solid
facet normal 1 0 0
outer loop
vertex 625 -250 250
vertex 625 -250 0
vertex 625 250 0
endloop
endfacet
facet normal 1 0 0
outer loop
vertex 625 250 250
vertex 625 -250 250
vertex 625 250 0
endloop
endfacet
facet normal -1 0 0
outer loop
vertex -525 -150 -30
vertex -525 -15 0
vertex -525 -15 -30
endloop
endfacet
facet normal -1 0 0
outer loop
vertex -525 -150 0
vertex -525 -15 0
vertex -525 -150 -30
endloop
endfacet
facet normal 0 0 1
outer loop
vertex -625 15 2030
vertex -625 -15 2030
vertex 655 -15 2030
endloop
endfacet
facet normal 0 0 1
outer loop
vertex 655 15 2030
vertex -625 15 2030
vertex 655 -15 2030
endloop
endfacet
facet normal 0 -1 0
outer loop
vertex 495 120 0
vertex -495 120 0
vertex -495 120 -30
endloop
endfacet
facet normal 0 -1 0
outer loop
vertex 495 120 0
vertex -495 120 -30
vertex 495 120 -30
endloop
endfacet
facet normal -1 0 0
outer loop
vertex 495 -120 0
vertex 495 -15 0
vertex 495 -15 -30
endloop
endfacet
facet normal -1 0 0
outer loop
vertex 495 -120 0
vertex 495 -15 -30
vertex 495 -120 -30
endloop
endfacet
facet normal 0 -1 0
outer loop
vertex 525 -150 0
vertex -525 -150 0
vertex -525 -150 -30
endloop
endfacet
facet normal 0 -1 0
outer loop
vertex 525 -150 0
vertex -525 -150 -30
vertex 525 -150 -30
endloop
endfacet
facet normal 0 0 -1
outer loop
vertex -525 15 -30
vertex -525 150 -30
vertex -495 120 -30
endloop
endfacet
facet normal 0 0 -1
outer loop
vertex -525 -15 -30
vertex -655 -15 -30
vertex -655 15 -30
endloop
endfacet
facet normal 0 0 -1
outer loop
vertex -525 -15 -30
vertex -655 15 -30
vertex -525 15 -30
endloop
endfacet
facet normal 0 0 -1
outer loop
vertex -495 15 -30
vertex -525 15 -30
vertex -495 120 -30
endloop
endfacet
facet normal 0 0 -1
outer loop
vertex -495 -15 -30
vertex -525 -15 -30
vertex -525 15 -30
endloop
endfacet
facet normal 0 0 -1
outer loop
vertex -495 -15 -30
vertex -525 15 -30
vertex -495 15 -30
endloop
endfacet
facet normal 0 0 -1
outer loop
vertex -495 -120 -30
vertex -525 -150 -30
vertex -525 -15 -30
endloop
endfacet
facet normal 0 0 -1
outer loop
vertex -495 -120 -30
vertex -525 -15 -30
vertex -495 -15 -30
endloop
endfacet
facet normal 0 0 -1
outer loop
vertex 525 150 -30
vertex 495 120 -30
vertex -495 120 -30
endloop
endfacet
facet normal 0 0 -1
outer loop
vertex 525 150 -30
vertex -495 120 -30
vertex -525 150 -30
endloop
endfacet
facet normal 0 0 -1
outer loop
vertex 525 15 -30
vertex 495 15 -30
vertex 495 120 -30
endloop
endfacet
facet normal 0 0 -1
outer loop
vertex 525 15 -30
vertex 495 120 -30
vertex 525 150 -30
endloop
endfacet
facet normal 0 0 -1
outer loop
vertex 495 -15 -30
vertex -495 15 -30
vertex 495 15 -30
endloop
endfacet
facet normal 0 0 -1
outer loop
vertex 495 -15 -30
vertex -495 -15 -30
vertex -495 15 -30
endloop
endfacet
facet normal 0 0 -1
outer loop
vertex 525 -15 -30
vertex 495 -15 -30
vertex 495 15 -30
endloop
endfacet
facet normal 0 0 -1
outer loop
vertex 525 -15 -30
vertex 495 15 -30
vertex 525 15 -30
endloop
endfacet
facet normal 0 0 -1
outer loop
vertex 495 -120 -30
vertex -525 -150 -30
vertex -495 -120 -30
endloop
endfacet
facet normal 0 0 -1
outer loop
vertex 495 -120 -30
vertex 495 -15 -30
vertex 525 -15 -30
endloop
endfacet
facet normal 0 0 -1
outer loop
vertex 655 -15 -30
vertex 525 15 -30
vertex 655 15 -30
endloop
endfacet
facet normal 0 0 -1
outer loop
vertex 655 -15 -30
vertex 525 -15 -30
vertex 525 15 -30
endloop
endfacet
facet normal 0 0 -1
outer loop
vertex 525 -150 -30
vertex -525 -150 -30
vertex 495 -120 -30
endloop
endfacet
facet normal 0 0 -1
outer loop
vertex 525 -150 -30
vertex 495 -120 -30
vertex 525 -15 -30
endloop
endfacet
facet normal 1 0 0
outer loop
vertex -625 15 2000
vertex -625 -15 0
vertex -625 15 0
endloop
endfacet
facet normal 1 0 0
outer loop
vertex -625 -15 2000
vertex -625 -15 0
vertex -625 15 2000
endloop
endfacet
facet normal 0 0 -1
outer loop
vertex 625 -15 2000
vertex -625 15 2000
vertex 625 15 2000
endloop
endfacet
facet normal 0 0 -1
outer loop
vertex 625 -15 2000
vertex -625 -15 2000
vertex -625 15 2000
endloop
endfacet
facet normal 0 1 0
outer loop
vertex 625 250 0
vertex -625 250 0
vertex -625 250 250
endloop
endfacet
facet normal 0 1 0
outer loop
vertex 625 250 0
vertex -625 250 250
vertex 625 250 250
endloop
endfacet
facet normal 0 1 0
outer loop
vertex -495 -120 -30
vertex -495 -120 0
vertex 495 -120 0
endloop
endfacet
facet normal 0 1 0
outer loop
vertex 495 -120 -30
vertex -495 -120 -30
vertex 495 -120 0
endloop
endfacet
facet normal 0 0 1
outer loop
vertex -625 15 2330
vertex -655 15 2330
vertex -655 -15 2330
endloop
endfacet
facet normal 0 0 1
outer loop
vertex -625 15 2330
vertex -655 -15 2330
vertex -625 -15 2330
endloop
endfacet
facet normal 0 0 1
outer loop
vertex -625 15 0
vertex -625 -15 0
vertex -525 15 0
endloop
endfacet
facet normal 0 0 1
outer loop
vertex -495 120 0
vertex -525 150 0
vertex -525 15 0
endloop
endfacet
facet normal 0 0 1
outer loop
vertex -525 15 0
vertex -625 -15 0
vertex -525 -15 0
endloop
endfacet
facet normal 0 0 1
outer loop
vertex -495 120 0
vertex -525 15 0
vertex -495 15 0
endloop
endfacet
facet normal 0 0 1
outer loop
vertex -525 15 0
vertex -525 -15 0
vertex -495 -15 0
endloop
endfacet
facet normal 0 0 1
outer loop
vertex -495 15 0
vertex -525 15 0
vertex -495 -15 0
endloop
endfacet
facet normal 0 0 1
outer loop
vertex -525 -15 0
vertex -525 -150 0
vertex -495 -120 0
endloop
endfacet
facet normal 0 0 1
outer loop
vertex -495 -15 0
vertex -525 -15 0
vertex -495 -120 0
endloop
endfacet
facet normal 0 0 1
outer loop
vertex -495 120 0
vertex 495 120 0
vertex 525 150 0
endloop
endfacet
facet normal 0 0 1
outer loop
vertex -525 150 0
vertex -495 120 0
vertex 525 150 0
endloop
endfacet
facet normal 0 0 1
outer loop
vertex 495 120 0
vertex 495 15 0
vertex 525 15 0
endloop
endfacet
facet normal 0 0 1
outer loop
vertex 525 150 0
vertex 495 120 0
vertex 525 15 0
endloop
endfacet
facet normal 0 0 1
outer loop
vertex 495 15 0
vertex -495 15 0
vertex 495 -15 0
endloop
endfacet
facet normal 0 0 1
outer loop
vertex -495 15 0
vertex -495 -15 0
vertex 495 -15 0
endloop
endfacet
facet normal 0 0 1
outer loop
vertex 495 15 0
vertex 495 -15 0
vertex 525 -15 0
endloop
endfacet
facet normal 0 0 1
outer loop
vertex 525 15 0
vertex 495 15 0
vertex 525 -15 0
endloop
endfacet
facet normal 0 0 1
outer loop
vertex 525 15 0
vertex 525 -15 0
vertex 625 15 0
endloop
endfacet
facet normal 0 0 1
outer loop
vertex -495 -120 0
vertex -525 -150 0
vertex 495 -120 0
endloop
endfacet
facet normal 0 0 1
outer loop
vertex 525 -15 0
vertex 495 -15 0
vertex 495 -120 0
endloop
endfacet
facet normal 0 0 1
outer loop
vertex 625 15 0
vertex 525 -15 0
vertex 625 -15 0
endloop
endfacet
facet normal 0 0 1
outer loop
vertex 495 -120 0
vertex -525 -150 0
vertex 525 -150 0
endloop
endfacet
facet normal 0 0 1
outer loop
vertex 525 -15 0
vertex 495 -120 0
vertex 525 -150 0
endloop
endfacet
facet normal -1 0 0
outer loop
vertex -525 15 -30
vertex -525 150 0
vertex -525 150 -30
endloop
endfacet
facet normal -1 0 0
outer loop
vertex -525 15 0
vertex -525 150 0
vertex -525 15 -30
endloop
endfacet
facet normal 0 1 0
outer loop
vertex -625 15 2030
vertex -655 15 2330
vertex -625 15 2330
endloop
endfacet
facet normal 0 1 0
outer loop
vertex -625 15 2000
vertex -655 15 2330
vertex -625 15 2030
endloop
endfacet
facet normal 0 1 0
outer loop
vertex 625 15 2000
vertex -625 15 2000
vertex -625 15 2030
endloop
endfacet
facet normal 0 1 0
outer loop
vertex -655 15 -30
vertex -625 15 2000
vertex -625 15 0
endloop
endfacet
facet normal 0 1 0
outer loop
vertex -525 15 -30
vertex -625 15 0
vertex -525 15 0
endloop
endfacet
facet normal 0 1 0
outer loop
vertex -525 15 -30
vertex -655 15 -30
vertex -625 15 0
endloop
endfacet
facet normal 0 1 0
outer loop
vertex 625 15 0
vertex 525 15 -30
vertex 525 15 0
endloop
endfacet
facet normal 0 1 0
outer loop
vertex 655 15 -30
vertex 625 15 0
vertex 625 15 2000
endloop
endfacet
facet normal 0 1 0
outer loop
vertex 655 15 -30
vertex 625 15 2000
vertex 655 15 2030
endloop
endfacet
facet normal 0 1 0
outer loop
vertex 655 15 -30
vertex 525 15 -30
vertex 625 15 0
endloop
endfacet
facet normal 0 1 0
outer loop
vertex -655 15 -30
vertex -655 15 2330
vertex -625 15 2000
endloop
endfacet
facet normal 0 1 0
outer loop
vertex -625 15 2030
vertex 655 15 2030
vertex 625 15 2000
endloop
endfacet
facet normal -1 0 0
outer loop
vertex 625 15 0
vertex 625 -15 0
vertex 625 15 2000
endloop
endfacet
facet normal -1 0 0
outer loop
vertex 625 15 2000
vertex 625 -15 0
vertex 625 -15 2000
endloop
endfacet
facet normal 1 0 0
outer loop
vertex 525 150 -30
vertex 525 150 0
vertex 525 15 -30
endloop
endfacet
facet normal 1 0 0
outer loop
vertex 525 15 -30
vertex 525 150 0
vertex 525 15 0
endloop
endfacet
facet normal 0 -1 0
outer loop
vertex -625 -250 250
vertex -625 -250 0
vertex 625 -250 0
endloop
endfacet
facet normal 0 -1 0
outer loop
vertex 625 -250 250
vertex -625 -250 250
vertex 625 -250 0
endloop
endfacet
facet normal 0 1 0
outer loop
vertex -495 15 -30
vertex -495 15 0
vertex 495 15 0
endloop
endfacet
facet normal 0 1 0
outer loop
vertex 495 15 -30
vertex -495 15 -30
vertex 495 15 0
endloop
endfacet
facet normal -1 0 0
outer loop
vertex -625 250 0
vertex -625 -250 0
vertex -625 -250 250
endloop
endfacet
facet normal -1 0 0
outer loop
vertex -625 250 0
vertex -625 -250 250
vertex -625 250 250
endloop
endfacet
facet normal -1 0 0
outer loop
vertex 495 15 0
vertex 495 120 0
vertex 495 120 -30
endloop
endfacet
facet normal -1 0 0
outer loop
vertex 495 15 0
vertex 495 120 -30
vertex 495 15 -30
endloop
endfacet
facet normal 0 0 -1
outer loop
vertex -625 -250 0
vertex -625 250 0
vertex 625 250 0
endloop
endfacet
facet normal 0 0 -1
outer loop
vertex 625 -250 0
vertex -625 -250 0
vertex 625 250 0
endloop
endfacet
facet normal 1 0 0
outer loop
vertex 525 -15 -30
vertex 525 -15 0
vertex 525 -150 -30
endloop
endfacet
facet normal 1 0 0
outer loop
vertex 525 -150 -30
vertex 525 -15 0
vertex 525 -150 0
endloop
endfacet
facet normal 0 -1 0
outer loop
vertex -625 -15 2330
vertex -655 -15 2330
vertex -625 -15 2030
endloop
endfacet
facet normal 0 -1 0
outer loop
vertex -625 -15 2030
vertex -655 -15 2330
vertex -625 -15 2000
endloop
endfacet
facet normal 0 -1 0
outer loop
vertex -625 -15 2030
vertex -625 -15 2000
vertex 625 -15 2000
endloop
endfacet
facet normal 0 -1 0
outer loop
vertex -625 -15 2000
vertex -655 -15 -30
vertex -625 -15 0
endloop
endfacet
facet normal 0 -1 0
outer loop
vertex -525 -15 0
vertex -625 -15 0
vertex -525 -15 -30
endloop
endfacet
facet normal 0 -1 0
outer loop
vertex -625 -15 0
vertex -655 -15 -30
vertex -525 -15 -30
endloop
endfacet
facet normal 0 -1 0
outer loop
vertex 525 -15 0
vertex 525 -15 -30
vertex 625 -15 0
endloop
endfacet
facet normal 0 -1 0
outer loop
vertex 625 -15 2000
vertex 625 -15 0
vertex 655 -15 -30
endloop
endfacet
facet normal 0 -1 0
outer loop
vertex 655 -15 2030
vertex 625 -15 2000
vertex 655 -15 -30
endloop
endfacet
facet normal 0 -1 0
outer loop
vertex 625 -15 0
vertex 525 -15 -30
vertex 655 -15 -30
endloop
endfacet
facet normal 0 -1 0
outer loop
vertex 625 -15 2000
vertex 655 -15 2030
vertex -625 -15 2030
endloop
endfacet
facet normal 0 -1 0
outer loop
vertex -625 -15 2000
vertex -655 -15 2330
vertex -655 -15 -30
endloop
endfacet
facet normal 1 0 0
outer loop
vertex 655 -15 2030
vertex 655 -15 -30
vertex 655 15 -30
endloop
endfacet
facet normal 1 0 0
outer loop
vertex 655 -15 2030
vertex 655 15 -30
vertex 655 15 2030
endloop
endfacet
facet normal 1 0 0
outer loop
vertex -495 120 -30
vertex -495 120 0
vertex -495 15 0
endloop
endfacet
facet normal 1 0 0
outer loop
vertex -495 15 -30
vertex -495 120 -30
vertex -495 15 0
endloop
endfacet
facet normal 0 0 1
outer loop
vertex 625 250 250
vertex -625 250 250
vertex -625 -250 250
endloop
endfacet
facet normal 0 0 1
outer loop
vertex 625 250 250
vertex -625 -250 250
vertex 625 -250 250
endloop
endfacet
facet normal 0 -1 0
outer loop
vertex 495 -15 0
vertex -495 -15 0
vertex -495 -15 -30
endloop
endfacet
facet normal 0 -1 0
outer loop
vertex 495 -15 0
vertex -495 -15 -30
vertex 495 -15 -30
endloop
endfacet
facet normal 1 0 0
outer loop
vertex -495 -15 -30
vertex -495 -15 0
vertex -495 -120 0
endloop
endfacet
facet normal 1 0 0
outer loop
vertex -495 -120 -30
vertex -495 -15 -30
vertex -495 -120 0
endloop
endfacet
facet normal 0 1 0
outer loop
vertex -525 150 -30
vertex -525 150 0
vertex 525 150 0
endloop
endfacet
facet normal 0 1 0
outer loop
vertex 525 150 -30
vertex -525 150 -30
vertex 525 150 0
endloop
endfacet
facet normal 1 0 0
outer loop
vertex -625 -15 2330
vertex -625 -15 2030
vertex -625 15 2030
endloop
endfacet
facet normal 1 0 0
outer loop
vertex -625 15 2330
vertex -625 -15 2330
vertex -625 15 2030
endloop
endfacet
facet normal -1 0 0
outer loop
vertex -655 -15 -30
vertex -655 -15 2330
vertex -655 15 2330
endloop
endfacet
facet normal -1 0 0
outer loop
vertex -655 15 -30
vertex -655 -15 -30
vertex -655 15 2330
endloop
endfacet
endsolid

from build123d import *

# Parameters (mm, degrees)
F0_W     = 1250
F0_H     = 500
F1_DEPTH = 250
F2_W     = 1310
F2_H     = 2060
F2_W_2   = 1250
F2_H_2   = 2000
F3_DEPTH = 15
F4_W     = 1050
F4_H     = 300
F4_W_2   = 990
F4_H_2   = 240
F5_DEPTH = 30
F6_W     = 30
F6_H     = 30
F7_DEPTH = 300


with BuildPart() as f1:
    # F0 (on Top) → F1 (new body)
    with BuildSketch(Plane.XY):
        Rectangle(F0_W, F0_H)
    extrude(amount=F1_DEPTH)


with BuildPart() as f3:
    # F2 (on Front) → F3 (new body, symmetric)
    with BuildSketch(Plane.XZ):
        with Locations((0, 1000)):
            Rectangle(F2_W, F2_H)
        with Locations((0, 1000)):
            Rectangle(F2_W_2, F2_H_2, mode=Mode.SUBTRACT)
    extrude(amount=F3_DEPTH, both=True)

    # F4 (on face) → F5 (join)
    with BuildSketch(Plane(origin=(0, 0, 0), x_dir=(1, 0, 0), z_dir=(0, 0, -1))):
        Rectangle(F4_W, F4_H)
        Rectangle(F4_W_2, F4_H_2, mode=Mode.SUBTRACT)
    extrude(amount=F5_DEPTH)

    # F6 (on face) → F7 (join)
    with BuildSketch(Plane.XY.offset(2030)):
        with Locations((-640, 0)):
            Rectangle(F6_W, F6_H)
    extrude(amount=F7_DEPTH)


solid = Compound([f1.part, f3.part])
